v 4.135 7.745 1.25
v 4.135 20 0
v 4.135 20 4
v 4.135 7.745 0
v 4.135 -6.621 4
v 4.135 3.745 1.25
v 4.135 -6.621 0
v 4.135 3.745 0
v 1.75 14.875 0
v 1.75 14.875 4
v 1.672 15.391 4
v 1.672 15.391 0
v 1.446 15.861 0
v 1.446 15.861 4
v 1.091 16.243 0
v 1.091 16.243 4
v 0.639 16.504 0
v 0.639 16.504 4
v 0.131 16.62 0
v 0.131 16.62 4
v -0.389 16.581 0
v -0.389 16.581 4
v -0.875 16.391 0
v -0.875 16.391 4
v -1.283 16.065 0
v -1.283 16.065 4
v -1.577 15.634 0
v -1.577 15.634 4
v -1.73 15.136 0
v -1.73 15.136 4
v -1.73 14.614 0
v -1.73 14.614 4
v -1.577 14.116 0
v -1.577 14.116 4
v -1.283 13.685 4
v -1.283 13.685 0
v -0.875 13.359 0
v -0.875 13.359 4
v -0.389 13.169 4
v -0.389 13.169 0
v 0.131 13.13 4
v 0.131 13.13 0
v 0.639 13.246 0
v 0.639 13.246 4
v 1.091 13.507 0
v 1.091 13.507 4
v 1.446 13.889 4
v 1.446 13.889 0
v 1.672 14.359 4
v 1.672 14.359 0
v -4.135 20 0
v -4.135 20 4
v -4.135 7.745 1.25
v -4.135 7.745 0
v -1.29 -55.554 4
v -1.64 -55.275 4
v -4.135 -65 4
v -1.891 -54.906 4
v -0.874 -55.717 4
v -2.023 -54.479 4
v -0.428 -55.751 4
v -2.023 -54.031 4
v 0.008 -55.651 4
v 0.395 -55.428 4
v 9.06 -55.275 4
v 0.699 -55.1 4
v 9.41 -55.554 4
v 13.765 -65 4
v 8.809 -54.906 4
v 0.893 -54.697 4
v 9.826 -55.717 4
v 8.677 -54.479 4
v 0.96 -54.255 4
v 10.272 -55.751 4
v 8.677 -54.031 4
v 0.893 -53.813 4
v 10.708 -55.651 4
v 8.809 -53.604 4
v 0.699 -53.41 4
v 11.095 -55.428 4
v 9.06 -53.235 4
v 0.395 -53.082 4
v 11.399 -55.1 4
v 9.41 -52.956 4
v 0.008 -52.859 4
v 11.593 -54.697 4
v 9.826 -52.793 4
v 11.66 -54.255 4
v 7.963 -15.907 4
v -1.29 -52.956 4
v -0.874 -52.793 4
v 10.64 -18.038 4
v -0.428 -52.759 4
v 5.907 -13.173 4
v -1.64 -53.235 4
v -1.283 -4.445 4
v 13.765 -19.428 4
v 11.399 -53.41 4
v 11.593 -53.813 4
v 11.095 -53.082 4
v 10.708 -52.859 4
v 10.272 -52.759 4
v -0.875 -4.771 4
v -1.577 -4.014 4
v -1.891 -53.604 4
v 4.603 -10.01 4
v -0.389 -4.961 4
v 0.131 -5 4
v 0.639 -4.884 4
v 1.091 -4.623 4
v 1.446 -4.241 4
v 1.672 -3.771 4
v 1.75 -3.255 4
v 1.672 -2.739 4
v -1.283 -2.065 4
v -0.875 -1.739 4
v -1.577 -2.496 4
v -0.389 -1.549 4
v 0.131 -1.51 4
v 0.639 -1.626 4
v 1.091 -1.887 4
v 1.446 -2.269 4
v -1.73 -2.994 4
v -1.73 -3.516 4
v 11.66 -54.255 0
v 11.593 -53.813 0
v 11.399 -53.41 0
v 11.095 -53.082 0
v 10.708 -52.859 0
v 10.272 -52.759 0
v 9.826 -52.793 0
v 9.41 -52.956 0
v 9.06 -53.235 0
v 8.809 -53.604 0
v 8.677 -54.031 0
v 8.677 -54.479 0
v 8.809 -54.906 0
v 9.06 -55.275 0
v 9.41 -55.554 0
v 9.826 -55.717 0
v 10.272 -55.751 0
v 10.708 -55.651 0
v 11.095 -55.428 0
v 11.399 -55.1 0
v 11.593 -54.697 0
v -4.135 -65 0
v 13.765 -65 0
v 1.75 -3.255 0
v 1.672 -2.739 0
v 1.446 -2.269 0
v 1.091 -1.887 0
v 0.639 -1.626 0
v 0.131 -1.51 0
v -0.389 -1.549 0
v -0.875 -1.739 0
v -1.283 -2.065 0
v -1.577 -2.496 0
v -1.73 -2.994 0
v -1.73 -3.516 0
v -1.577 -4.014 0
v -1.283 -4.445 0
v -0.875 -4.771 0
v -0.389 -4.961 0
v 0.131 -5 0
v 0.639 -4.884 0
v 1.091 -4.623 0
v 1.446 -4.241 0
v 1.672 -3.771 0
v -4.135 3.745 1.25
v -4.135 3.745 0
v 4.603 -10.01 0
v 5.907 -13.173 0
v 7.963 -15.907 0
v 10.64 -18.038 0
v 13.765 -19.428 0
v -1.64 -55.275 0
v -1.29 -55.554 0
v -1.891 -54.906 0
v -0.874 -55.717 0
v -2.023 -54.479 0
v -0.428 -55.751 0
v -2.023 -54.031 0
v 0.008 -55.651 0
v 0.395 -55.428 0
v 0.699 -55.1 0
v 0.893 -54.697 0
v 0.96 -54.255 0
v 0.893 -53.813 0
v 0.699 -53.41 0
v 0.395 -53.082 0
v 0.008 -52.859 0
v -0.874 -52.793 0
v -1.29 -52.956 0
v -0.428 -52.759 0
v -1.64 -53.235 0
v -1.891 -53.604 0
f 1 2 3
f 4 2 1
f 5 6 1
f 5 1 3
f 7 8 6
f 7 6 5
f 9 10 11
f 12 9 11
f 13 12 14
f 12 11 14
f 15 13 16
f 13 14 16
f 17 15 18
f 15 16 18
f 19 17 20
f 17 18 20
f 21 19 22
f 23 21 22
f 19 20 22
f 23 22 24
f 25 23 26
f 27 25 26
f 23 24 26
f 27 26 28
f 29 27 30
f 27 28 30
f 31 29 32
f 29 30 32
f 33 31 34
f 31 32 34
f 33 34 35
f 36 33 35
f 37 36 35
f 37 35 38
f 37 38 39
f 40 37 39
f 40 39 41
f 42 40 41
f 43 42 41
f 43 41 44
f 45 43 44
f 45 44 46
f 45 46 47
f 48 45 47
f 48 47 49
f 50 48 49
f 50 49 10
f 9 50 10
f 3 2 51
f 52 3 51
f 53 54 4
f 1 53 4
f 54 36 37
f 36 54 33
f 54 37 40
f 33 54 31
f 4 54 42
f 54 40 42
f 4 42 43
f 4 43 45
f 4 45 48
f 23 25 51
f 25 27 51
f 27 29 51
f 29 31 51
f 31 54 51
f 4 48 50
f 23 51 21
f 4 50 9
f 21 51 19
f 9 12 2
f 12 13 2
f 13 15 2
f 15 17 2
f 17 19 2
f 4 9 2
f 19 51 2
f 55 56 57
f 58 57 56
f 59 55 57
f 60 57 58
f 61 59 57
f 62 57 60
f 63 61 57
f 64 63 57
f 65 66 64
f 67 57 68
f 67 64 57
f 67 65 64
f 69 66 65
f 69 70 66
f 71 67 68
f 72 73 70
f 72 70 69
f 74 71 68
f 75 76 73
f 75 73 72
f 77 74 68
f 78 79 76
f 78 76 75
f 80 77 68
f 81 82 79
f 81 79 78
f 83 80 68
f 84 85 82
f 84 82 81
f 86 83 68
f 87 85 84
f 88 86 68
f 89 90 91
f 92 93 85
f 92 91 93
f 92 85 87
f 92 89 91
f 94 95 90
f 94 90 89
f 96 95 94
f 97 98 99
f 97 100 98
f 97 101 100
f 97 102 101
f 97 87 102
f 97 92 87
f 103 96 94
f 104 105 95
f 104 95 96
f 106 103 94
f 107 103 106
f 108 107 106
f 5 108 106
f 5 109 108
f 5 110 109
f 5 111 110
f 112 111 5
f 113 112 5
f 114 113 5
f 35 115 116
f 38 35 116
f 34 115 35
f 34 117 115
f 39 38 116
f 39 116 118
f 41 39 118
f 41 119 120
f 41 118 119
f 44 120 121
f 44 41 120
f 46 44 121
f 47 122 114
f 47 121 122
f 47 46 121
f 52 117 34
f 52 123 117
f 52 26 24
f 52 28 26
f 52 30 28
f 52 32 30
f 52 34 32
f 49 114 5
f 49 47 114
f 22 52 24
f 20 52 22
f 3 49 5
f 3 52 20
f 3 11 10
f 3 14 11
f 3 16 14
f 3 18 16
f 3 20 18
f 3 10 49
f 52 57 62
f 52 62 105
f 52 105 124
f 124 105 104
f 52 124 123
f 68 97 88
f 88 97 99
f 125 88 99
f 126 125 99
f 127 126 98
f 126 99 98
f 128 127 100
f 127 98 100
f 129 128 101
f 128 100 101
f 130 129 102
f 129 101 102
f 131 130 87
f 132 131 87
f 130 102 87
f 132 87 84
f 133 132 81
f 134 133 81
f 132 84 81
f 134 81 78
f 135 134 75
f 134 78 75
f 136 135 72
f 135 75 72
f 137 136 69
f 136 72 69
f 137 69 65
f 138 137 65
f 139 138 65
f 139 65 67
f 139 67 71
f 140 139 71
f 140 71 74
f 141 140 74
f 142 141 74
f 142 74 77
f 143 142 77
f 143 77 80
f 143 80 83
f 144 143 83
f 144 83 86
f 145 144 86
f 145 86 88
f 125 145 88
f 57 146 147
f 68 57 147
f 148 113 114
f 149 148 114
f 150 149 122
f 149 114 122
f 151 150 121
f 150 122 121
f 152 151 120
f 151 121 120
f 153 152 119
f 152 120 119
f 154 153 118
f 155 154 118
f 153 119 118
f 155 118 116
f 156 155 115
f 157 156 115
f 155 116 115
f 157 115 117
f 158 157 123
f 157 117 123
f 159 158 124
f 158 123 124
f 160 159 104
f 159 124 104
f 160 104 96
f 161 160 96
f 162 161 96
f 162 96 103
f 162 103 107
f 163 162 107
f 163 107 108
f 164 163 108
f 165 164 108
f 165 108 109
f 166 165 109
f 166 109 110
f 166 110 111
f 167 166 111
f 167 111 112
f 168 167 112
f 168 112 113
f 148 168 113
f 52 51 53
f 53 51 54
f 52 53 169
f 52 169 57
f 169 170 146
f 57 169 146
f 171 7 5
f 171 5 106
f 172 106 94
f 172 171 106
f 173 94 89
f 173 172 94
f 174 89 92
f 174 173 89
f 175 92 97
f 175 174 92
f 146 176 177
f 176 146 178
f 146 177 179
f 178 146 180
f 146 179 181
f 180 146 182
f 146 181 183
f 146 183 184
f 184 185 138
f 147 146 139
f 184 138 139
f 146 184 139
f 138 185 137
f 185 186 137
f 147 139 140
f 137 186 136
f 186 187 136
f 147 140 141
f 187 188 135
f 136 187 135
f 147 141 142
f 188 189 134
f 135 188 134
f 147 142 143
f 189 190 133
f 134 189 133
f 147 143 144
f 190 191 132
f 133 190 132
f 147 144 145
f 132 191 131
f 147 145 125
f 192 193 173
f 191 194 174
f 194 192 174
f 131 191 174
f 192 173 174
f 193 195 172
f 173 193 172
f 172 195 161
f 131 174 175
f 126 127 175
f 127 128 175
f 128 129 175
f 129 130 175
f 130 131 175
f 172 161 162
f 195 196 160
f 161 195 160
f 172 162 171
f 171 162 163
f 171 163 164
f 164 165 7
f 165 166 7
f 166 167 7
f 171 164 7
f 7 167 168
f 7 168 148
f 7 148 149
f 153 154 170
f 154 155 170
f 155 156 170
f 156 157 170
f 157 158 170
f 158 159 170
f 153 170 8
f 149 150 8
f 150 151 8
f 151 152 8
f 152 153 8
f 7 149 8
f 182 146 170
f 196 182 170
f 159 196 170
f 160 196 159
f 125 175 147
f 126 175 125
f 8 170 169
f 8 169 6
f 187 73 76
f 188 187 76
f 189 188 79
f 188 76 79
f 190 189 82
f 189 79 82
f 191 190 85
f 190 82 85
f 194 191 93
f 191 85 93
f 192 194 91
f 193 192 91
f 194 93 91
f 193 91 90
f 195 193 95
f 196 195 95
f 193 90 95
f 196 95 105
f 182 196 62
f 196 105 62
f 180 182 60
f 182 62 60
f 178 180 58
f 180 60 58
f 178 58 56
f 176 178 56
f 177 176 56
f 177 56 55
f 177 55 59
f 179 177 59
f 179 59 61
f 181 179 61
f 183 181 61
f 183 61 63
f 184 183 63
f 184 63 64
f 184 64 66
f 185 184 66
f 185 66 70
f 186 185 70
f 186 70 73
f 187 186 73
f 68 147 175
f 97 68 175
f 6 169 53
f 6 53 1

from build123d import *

# Parameters (mm, degrees)
PAD002_DEPTH    = 4
SKETCH008_R     = 1.75
SKETCH008_R_2   = 1.5
POCKET009_DEPTH = 5
SKETCH009_W     = 10.460062
SKETCH009_H     = 4
POCKET001_DEPTH = 1.25


with BuildPart() as part:
    # Sketch007 → Pad002 (new body)
    with BuildSketch(Plane.XY):
        with BuildLine():
            Line((-4.135, 20), (-4.135, -65))
            Line((-4.135, -65), (13.765, -65))
            Line((13.765, -65), (13.765, -19.428397))
            ThreePointArc((4.135, -6.621152), (6.848343, -14.605049), (13.765, -19.428397))
            Line((4.135, 20), (4.135, -6.621152))
            Line((4.135, 20), (-4.135, 20))
        make_face()
    extrude(amount=PAD002_DEPTH)

    # Sketch008 (on Face8 of Pad002) → Pocket009 (cut)
    with BuildSketch(Plane.XY.offset(4)):
        with Locations((0, 14.875)):
            Circle(SKETCH008_R)
        with Locations((0, -3.255)):
            Circle(SKETCH008_R)
        with Locations((-0.54, -54.255)):
            Circle(SKETCH008_R_2)
        with Locations((10.16, -54.255)):
            Circle(SKETCH008_R_2)
    extrude(amount=-POCKET009_DEPTH, mode=Mode.SUBTRACT)

    # Sketch009 (on Face4 of Pocket009) → Pocket001 (cut)
    with BuildSketch(Plane(origin=(0, 0, 0), x_dir=(1, 0, 0), z_dir=(0, 0, -1))):
        with Locations((-0.716524, -5.745)):
            Rectangle(SKETCH009_W, SKETCH009_H)
    extrude(amount=-POCKET001_DEPTH, mode=Mode.SUBTRACT)


solid = part.part
